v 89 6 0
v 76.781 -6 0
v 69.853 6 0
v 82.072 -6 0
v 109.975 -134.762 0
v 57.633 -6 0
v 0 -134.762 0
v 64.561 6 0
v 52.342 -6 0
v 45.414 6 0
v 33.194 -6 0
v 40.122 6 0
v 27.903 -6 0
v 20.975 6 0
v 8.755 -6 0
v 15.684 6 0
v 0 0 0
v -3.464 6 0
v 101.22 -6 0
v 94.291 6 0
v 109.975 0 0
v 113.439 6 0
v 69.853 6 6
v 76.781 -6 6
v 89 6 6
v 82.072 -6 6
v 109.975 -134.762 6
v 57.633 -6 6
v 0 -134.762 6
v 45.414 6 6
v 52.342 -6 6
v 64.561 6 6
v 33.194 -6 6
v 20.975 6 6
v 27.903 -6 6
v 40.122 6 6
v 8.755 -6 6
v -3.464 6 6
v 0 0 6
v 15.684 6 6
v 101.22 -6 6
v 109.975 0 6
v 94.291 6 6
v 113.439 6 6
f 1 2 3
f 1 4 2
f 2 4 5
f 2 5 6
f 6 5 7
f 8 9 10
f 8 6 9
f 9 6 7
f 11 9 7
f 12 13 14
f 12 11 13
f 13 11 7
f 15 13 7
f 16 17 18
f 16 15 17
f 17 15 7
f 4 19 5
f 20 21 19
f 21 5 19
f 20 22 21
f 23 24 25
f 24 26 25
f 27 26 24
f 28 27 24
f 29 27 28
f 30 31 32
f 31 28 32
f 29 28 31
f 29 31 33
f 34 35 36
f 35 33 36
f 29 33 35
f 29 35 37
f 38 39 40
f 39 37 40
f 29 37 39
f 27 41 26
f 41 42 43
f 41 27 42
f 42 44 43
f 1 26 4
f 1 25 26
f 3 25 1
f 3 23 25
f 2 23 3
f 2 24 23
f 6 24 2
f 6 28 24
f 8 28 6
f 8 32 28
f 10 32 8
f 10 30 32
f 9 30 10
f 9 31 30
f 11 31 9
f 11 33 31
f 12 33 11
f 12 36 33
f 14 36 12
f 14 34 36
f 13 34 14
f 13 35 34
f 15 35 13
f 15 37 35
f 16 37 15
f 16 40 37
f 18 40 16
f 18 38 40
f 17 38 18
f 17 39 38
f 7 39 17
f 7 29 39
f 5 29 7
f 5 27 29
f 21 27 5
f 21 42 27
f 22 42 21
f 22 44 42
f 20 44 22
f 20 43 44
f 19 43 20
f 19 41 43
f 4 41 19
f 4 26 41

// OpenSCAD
// =============================================================================
// CONSOLE10 — Top Panel Half  v2.4
// Flat 6 mm panel with 4 mm cheek-tabs at each outer edge and a trapezoidal
// dovetail castellation at the centerline (30° from vertical, Apollo 13
// command module flight console reference).
//
// Two parts: LEFT half (5 tabs) and RIGHT half (4 tabs). Set is_left_half
// below to choose which half this build produces.
//
// Halves are joined by PLA solvent/glue along the dovetail seam. No screws,
// no heat-set inserts, no rabbet.
//
// Print orientation: flat on bed, either face down (geometry is symmetric
// across the panel-thickness midplane).
// =============================================================================

is_left_half = true;       // true = LEFT, false = RIGHT

// ---------- LOCKED PARAMETERS -----------------------------------------------
panel_depth       = 109.975;   // x: front-back
panel_thick       = 6;         // z: thickness
interior_width    = 261.525;   // cheek-interior-to-cheek-interior
panel_half_width  = interior_width / 2;
cheek_tab         = 4;         // extension into cheek channel (each side)

// Castellation
n_segments        = 9;         // 5 tabs + 4 slots (LEFT); 4 tabs + 5 slots (RIGHT)
tab_protrude      = 6;         // tab extension past centerline
wedge_angle       = 30;        // wedge angle from vertical, degrees

// ---------- DERIVED ---------------------------------------------------------
seg_pitch         = panel_depth / n_segments;                          // 12.2194 mm
tab_base          = seg_pitch;                                         // 12.2194 mm (= full segment at y=0)
tab_tip           = seg_pitch + 2 * tab_protrude * tan(wedge_angle);   // 19.147 mm (dovetail tip)

echo("=== Console10 top panel half v2.4 ===");
echo(str("  is_left_half  = ", is_left_half));
echo(str("  seg_pitch     = ", seg_pitch, " mm"));
echo(str("  tab_base/tip  = ", tab_base, " / ", tab_tip, " mm"));

// ---------- 2D HALF GEOMETRY ------------------------------------------------
// Local frame:
//   x = 0 .. panel_depth          (front to back)
//   y = 0 is the centerline
//   LEFT  half body sits in y < 0; tabs extend into y > 0; slots cut into y < 0
//   RIGHT half body sits in y > 0; tabs extend into y < 0; slots cut into y > 0

function this_tab_segs()  = is_left_half ? [1,3,5,7,9] : [2,4,6,8];
function this_slot_segs() = is_left_half ? [2,4,6,8] : [1,3,5,7,9];

// Tab polygon — this half pushes into the OTHER half's territory.
// Base at y=0 (full segment width); tip at y=±tab_protrude (wider, dovetail).
module tab_at(seg_idx) {
    cx = (seg_idx - 0.5) * seg_pitch;
    dir = is_left_half ? 1 : -1;
    polygon([
        [cx - tab_base/2, 0],
        [cx + tab_base/2, 0],
        [cx + tab_tip/2,  dir * tab_protrude],
        [cx - tab_tip/2,  dir * tab_protrude]
    ]);
}

// Slot polygon — cut into THIS half's body (matches the OTHER half's tab).
module slot_at(seg_idx) {
    cx = (seg_idx - 0.5) * seg_pitch;
    dir = is_left_half ? -1 : 1;
    polygon([
        [cx - tab_base/2, 0],
        [cx + tab_base/2, 0],
        [cx + tab_tip/2,  dir * tab_protrude],
        [cx - tab_tip/2,  dir * tab_protrude]
    ]);
}

// Half-body rectangle (excludes castellation).
module body_rect_2d() {
    if (is_left_half) {
        translate([0, -(panel_half_width + cheek_tab)])
            square([panel_depth, panel_half_width + cheek_tab]);
    } else {
        square([panel_depth, panel_half_width + cheek_tab]);
    }
}

// Assembled 2D half = body + tabs - slots
module half_2d() {
    difference() {
        union() {
            body_rect_2d();
            for (s = this_tab_segs()) tab_at(s);
        }
        for (s = this_slot_segs()) slot_at(s);
    }
}

// ---------- ASSEMBLED HALF --------------------------------------------------
module top_panel_half() {
    linear_extrude(height = panel_thick)
        half_2d();
}

top_panel_half();
